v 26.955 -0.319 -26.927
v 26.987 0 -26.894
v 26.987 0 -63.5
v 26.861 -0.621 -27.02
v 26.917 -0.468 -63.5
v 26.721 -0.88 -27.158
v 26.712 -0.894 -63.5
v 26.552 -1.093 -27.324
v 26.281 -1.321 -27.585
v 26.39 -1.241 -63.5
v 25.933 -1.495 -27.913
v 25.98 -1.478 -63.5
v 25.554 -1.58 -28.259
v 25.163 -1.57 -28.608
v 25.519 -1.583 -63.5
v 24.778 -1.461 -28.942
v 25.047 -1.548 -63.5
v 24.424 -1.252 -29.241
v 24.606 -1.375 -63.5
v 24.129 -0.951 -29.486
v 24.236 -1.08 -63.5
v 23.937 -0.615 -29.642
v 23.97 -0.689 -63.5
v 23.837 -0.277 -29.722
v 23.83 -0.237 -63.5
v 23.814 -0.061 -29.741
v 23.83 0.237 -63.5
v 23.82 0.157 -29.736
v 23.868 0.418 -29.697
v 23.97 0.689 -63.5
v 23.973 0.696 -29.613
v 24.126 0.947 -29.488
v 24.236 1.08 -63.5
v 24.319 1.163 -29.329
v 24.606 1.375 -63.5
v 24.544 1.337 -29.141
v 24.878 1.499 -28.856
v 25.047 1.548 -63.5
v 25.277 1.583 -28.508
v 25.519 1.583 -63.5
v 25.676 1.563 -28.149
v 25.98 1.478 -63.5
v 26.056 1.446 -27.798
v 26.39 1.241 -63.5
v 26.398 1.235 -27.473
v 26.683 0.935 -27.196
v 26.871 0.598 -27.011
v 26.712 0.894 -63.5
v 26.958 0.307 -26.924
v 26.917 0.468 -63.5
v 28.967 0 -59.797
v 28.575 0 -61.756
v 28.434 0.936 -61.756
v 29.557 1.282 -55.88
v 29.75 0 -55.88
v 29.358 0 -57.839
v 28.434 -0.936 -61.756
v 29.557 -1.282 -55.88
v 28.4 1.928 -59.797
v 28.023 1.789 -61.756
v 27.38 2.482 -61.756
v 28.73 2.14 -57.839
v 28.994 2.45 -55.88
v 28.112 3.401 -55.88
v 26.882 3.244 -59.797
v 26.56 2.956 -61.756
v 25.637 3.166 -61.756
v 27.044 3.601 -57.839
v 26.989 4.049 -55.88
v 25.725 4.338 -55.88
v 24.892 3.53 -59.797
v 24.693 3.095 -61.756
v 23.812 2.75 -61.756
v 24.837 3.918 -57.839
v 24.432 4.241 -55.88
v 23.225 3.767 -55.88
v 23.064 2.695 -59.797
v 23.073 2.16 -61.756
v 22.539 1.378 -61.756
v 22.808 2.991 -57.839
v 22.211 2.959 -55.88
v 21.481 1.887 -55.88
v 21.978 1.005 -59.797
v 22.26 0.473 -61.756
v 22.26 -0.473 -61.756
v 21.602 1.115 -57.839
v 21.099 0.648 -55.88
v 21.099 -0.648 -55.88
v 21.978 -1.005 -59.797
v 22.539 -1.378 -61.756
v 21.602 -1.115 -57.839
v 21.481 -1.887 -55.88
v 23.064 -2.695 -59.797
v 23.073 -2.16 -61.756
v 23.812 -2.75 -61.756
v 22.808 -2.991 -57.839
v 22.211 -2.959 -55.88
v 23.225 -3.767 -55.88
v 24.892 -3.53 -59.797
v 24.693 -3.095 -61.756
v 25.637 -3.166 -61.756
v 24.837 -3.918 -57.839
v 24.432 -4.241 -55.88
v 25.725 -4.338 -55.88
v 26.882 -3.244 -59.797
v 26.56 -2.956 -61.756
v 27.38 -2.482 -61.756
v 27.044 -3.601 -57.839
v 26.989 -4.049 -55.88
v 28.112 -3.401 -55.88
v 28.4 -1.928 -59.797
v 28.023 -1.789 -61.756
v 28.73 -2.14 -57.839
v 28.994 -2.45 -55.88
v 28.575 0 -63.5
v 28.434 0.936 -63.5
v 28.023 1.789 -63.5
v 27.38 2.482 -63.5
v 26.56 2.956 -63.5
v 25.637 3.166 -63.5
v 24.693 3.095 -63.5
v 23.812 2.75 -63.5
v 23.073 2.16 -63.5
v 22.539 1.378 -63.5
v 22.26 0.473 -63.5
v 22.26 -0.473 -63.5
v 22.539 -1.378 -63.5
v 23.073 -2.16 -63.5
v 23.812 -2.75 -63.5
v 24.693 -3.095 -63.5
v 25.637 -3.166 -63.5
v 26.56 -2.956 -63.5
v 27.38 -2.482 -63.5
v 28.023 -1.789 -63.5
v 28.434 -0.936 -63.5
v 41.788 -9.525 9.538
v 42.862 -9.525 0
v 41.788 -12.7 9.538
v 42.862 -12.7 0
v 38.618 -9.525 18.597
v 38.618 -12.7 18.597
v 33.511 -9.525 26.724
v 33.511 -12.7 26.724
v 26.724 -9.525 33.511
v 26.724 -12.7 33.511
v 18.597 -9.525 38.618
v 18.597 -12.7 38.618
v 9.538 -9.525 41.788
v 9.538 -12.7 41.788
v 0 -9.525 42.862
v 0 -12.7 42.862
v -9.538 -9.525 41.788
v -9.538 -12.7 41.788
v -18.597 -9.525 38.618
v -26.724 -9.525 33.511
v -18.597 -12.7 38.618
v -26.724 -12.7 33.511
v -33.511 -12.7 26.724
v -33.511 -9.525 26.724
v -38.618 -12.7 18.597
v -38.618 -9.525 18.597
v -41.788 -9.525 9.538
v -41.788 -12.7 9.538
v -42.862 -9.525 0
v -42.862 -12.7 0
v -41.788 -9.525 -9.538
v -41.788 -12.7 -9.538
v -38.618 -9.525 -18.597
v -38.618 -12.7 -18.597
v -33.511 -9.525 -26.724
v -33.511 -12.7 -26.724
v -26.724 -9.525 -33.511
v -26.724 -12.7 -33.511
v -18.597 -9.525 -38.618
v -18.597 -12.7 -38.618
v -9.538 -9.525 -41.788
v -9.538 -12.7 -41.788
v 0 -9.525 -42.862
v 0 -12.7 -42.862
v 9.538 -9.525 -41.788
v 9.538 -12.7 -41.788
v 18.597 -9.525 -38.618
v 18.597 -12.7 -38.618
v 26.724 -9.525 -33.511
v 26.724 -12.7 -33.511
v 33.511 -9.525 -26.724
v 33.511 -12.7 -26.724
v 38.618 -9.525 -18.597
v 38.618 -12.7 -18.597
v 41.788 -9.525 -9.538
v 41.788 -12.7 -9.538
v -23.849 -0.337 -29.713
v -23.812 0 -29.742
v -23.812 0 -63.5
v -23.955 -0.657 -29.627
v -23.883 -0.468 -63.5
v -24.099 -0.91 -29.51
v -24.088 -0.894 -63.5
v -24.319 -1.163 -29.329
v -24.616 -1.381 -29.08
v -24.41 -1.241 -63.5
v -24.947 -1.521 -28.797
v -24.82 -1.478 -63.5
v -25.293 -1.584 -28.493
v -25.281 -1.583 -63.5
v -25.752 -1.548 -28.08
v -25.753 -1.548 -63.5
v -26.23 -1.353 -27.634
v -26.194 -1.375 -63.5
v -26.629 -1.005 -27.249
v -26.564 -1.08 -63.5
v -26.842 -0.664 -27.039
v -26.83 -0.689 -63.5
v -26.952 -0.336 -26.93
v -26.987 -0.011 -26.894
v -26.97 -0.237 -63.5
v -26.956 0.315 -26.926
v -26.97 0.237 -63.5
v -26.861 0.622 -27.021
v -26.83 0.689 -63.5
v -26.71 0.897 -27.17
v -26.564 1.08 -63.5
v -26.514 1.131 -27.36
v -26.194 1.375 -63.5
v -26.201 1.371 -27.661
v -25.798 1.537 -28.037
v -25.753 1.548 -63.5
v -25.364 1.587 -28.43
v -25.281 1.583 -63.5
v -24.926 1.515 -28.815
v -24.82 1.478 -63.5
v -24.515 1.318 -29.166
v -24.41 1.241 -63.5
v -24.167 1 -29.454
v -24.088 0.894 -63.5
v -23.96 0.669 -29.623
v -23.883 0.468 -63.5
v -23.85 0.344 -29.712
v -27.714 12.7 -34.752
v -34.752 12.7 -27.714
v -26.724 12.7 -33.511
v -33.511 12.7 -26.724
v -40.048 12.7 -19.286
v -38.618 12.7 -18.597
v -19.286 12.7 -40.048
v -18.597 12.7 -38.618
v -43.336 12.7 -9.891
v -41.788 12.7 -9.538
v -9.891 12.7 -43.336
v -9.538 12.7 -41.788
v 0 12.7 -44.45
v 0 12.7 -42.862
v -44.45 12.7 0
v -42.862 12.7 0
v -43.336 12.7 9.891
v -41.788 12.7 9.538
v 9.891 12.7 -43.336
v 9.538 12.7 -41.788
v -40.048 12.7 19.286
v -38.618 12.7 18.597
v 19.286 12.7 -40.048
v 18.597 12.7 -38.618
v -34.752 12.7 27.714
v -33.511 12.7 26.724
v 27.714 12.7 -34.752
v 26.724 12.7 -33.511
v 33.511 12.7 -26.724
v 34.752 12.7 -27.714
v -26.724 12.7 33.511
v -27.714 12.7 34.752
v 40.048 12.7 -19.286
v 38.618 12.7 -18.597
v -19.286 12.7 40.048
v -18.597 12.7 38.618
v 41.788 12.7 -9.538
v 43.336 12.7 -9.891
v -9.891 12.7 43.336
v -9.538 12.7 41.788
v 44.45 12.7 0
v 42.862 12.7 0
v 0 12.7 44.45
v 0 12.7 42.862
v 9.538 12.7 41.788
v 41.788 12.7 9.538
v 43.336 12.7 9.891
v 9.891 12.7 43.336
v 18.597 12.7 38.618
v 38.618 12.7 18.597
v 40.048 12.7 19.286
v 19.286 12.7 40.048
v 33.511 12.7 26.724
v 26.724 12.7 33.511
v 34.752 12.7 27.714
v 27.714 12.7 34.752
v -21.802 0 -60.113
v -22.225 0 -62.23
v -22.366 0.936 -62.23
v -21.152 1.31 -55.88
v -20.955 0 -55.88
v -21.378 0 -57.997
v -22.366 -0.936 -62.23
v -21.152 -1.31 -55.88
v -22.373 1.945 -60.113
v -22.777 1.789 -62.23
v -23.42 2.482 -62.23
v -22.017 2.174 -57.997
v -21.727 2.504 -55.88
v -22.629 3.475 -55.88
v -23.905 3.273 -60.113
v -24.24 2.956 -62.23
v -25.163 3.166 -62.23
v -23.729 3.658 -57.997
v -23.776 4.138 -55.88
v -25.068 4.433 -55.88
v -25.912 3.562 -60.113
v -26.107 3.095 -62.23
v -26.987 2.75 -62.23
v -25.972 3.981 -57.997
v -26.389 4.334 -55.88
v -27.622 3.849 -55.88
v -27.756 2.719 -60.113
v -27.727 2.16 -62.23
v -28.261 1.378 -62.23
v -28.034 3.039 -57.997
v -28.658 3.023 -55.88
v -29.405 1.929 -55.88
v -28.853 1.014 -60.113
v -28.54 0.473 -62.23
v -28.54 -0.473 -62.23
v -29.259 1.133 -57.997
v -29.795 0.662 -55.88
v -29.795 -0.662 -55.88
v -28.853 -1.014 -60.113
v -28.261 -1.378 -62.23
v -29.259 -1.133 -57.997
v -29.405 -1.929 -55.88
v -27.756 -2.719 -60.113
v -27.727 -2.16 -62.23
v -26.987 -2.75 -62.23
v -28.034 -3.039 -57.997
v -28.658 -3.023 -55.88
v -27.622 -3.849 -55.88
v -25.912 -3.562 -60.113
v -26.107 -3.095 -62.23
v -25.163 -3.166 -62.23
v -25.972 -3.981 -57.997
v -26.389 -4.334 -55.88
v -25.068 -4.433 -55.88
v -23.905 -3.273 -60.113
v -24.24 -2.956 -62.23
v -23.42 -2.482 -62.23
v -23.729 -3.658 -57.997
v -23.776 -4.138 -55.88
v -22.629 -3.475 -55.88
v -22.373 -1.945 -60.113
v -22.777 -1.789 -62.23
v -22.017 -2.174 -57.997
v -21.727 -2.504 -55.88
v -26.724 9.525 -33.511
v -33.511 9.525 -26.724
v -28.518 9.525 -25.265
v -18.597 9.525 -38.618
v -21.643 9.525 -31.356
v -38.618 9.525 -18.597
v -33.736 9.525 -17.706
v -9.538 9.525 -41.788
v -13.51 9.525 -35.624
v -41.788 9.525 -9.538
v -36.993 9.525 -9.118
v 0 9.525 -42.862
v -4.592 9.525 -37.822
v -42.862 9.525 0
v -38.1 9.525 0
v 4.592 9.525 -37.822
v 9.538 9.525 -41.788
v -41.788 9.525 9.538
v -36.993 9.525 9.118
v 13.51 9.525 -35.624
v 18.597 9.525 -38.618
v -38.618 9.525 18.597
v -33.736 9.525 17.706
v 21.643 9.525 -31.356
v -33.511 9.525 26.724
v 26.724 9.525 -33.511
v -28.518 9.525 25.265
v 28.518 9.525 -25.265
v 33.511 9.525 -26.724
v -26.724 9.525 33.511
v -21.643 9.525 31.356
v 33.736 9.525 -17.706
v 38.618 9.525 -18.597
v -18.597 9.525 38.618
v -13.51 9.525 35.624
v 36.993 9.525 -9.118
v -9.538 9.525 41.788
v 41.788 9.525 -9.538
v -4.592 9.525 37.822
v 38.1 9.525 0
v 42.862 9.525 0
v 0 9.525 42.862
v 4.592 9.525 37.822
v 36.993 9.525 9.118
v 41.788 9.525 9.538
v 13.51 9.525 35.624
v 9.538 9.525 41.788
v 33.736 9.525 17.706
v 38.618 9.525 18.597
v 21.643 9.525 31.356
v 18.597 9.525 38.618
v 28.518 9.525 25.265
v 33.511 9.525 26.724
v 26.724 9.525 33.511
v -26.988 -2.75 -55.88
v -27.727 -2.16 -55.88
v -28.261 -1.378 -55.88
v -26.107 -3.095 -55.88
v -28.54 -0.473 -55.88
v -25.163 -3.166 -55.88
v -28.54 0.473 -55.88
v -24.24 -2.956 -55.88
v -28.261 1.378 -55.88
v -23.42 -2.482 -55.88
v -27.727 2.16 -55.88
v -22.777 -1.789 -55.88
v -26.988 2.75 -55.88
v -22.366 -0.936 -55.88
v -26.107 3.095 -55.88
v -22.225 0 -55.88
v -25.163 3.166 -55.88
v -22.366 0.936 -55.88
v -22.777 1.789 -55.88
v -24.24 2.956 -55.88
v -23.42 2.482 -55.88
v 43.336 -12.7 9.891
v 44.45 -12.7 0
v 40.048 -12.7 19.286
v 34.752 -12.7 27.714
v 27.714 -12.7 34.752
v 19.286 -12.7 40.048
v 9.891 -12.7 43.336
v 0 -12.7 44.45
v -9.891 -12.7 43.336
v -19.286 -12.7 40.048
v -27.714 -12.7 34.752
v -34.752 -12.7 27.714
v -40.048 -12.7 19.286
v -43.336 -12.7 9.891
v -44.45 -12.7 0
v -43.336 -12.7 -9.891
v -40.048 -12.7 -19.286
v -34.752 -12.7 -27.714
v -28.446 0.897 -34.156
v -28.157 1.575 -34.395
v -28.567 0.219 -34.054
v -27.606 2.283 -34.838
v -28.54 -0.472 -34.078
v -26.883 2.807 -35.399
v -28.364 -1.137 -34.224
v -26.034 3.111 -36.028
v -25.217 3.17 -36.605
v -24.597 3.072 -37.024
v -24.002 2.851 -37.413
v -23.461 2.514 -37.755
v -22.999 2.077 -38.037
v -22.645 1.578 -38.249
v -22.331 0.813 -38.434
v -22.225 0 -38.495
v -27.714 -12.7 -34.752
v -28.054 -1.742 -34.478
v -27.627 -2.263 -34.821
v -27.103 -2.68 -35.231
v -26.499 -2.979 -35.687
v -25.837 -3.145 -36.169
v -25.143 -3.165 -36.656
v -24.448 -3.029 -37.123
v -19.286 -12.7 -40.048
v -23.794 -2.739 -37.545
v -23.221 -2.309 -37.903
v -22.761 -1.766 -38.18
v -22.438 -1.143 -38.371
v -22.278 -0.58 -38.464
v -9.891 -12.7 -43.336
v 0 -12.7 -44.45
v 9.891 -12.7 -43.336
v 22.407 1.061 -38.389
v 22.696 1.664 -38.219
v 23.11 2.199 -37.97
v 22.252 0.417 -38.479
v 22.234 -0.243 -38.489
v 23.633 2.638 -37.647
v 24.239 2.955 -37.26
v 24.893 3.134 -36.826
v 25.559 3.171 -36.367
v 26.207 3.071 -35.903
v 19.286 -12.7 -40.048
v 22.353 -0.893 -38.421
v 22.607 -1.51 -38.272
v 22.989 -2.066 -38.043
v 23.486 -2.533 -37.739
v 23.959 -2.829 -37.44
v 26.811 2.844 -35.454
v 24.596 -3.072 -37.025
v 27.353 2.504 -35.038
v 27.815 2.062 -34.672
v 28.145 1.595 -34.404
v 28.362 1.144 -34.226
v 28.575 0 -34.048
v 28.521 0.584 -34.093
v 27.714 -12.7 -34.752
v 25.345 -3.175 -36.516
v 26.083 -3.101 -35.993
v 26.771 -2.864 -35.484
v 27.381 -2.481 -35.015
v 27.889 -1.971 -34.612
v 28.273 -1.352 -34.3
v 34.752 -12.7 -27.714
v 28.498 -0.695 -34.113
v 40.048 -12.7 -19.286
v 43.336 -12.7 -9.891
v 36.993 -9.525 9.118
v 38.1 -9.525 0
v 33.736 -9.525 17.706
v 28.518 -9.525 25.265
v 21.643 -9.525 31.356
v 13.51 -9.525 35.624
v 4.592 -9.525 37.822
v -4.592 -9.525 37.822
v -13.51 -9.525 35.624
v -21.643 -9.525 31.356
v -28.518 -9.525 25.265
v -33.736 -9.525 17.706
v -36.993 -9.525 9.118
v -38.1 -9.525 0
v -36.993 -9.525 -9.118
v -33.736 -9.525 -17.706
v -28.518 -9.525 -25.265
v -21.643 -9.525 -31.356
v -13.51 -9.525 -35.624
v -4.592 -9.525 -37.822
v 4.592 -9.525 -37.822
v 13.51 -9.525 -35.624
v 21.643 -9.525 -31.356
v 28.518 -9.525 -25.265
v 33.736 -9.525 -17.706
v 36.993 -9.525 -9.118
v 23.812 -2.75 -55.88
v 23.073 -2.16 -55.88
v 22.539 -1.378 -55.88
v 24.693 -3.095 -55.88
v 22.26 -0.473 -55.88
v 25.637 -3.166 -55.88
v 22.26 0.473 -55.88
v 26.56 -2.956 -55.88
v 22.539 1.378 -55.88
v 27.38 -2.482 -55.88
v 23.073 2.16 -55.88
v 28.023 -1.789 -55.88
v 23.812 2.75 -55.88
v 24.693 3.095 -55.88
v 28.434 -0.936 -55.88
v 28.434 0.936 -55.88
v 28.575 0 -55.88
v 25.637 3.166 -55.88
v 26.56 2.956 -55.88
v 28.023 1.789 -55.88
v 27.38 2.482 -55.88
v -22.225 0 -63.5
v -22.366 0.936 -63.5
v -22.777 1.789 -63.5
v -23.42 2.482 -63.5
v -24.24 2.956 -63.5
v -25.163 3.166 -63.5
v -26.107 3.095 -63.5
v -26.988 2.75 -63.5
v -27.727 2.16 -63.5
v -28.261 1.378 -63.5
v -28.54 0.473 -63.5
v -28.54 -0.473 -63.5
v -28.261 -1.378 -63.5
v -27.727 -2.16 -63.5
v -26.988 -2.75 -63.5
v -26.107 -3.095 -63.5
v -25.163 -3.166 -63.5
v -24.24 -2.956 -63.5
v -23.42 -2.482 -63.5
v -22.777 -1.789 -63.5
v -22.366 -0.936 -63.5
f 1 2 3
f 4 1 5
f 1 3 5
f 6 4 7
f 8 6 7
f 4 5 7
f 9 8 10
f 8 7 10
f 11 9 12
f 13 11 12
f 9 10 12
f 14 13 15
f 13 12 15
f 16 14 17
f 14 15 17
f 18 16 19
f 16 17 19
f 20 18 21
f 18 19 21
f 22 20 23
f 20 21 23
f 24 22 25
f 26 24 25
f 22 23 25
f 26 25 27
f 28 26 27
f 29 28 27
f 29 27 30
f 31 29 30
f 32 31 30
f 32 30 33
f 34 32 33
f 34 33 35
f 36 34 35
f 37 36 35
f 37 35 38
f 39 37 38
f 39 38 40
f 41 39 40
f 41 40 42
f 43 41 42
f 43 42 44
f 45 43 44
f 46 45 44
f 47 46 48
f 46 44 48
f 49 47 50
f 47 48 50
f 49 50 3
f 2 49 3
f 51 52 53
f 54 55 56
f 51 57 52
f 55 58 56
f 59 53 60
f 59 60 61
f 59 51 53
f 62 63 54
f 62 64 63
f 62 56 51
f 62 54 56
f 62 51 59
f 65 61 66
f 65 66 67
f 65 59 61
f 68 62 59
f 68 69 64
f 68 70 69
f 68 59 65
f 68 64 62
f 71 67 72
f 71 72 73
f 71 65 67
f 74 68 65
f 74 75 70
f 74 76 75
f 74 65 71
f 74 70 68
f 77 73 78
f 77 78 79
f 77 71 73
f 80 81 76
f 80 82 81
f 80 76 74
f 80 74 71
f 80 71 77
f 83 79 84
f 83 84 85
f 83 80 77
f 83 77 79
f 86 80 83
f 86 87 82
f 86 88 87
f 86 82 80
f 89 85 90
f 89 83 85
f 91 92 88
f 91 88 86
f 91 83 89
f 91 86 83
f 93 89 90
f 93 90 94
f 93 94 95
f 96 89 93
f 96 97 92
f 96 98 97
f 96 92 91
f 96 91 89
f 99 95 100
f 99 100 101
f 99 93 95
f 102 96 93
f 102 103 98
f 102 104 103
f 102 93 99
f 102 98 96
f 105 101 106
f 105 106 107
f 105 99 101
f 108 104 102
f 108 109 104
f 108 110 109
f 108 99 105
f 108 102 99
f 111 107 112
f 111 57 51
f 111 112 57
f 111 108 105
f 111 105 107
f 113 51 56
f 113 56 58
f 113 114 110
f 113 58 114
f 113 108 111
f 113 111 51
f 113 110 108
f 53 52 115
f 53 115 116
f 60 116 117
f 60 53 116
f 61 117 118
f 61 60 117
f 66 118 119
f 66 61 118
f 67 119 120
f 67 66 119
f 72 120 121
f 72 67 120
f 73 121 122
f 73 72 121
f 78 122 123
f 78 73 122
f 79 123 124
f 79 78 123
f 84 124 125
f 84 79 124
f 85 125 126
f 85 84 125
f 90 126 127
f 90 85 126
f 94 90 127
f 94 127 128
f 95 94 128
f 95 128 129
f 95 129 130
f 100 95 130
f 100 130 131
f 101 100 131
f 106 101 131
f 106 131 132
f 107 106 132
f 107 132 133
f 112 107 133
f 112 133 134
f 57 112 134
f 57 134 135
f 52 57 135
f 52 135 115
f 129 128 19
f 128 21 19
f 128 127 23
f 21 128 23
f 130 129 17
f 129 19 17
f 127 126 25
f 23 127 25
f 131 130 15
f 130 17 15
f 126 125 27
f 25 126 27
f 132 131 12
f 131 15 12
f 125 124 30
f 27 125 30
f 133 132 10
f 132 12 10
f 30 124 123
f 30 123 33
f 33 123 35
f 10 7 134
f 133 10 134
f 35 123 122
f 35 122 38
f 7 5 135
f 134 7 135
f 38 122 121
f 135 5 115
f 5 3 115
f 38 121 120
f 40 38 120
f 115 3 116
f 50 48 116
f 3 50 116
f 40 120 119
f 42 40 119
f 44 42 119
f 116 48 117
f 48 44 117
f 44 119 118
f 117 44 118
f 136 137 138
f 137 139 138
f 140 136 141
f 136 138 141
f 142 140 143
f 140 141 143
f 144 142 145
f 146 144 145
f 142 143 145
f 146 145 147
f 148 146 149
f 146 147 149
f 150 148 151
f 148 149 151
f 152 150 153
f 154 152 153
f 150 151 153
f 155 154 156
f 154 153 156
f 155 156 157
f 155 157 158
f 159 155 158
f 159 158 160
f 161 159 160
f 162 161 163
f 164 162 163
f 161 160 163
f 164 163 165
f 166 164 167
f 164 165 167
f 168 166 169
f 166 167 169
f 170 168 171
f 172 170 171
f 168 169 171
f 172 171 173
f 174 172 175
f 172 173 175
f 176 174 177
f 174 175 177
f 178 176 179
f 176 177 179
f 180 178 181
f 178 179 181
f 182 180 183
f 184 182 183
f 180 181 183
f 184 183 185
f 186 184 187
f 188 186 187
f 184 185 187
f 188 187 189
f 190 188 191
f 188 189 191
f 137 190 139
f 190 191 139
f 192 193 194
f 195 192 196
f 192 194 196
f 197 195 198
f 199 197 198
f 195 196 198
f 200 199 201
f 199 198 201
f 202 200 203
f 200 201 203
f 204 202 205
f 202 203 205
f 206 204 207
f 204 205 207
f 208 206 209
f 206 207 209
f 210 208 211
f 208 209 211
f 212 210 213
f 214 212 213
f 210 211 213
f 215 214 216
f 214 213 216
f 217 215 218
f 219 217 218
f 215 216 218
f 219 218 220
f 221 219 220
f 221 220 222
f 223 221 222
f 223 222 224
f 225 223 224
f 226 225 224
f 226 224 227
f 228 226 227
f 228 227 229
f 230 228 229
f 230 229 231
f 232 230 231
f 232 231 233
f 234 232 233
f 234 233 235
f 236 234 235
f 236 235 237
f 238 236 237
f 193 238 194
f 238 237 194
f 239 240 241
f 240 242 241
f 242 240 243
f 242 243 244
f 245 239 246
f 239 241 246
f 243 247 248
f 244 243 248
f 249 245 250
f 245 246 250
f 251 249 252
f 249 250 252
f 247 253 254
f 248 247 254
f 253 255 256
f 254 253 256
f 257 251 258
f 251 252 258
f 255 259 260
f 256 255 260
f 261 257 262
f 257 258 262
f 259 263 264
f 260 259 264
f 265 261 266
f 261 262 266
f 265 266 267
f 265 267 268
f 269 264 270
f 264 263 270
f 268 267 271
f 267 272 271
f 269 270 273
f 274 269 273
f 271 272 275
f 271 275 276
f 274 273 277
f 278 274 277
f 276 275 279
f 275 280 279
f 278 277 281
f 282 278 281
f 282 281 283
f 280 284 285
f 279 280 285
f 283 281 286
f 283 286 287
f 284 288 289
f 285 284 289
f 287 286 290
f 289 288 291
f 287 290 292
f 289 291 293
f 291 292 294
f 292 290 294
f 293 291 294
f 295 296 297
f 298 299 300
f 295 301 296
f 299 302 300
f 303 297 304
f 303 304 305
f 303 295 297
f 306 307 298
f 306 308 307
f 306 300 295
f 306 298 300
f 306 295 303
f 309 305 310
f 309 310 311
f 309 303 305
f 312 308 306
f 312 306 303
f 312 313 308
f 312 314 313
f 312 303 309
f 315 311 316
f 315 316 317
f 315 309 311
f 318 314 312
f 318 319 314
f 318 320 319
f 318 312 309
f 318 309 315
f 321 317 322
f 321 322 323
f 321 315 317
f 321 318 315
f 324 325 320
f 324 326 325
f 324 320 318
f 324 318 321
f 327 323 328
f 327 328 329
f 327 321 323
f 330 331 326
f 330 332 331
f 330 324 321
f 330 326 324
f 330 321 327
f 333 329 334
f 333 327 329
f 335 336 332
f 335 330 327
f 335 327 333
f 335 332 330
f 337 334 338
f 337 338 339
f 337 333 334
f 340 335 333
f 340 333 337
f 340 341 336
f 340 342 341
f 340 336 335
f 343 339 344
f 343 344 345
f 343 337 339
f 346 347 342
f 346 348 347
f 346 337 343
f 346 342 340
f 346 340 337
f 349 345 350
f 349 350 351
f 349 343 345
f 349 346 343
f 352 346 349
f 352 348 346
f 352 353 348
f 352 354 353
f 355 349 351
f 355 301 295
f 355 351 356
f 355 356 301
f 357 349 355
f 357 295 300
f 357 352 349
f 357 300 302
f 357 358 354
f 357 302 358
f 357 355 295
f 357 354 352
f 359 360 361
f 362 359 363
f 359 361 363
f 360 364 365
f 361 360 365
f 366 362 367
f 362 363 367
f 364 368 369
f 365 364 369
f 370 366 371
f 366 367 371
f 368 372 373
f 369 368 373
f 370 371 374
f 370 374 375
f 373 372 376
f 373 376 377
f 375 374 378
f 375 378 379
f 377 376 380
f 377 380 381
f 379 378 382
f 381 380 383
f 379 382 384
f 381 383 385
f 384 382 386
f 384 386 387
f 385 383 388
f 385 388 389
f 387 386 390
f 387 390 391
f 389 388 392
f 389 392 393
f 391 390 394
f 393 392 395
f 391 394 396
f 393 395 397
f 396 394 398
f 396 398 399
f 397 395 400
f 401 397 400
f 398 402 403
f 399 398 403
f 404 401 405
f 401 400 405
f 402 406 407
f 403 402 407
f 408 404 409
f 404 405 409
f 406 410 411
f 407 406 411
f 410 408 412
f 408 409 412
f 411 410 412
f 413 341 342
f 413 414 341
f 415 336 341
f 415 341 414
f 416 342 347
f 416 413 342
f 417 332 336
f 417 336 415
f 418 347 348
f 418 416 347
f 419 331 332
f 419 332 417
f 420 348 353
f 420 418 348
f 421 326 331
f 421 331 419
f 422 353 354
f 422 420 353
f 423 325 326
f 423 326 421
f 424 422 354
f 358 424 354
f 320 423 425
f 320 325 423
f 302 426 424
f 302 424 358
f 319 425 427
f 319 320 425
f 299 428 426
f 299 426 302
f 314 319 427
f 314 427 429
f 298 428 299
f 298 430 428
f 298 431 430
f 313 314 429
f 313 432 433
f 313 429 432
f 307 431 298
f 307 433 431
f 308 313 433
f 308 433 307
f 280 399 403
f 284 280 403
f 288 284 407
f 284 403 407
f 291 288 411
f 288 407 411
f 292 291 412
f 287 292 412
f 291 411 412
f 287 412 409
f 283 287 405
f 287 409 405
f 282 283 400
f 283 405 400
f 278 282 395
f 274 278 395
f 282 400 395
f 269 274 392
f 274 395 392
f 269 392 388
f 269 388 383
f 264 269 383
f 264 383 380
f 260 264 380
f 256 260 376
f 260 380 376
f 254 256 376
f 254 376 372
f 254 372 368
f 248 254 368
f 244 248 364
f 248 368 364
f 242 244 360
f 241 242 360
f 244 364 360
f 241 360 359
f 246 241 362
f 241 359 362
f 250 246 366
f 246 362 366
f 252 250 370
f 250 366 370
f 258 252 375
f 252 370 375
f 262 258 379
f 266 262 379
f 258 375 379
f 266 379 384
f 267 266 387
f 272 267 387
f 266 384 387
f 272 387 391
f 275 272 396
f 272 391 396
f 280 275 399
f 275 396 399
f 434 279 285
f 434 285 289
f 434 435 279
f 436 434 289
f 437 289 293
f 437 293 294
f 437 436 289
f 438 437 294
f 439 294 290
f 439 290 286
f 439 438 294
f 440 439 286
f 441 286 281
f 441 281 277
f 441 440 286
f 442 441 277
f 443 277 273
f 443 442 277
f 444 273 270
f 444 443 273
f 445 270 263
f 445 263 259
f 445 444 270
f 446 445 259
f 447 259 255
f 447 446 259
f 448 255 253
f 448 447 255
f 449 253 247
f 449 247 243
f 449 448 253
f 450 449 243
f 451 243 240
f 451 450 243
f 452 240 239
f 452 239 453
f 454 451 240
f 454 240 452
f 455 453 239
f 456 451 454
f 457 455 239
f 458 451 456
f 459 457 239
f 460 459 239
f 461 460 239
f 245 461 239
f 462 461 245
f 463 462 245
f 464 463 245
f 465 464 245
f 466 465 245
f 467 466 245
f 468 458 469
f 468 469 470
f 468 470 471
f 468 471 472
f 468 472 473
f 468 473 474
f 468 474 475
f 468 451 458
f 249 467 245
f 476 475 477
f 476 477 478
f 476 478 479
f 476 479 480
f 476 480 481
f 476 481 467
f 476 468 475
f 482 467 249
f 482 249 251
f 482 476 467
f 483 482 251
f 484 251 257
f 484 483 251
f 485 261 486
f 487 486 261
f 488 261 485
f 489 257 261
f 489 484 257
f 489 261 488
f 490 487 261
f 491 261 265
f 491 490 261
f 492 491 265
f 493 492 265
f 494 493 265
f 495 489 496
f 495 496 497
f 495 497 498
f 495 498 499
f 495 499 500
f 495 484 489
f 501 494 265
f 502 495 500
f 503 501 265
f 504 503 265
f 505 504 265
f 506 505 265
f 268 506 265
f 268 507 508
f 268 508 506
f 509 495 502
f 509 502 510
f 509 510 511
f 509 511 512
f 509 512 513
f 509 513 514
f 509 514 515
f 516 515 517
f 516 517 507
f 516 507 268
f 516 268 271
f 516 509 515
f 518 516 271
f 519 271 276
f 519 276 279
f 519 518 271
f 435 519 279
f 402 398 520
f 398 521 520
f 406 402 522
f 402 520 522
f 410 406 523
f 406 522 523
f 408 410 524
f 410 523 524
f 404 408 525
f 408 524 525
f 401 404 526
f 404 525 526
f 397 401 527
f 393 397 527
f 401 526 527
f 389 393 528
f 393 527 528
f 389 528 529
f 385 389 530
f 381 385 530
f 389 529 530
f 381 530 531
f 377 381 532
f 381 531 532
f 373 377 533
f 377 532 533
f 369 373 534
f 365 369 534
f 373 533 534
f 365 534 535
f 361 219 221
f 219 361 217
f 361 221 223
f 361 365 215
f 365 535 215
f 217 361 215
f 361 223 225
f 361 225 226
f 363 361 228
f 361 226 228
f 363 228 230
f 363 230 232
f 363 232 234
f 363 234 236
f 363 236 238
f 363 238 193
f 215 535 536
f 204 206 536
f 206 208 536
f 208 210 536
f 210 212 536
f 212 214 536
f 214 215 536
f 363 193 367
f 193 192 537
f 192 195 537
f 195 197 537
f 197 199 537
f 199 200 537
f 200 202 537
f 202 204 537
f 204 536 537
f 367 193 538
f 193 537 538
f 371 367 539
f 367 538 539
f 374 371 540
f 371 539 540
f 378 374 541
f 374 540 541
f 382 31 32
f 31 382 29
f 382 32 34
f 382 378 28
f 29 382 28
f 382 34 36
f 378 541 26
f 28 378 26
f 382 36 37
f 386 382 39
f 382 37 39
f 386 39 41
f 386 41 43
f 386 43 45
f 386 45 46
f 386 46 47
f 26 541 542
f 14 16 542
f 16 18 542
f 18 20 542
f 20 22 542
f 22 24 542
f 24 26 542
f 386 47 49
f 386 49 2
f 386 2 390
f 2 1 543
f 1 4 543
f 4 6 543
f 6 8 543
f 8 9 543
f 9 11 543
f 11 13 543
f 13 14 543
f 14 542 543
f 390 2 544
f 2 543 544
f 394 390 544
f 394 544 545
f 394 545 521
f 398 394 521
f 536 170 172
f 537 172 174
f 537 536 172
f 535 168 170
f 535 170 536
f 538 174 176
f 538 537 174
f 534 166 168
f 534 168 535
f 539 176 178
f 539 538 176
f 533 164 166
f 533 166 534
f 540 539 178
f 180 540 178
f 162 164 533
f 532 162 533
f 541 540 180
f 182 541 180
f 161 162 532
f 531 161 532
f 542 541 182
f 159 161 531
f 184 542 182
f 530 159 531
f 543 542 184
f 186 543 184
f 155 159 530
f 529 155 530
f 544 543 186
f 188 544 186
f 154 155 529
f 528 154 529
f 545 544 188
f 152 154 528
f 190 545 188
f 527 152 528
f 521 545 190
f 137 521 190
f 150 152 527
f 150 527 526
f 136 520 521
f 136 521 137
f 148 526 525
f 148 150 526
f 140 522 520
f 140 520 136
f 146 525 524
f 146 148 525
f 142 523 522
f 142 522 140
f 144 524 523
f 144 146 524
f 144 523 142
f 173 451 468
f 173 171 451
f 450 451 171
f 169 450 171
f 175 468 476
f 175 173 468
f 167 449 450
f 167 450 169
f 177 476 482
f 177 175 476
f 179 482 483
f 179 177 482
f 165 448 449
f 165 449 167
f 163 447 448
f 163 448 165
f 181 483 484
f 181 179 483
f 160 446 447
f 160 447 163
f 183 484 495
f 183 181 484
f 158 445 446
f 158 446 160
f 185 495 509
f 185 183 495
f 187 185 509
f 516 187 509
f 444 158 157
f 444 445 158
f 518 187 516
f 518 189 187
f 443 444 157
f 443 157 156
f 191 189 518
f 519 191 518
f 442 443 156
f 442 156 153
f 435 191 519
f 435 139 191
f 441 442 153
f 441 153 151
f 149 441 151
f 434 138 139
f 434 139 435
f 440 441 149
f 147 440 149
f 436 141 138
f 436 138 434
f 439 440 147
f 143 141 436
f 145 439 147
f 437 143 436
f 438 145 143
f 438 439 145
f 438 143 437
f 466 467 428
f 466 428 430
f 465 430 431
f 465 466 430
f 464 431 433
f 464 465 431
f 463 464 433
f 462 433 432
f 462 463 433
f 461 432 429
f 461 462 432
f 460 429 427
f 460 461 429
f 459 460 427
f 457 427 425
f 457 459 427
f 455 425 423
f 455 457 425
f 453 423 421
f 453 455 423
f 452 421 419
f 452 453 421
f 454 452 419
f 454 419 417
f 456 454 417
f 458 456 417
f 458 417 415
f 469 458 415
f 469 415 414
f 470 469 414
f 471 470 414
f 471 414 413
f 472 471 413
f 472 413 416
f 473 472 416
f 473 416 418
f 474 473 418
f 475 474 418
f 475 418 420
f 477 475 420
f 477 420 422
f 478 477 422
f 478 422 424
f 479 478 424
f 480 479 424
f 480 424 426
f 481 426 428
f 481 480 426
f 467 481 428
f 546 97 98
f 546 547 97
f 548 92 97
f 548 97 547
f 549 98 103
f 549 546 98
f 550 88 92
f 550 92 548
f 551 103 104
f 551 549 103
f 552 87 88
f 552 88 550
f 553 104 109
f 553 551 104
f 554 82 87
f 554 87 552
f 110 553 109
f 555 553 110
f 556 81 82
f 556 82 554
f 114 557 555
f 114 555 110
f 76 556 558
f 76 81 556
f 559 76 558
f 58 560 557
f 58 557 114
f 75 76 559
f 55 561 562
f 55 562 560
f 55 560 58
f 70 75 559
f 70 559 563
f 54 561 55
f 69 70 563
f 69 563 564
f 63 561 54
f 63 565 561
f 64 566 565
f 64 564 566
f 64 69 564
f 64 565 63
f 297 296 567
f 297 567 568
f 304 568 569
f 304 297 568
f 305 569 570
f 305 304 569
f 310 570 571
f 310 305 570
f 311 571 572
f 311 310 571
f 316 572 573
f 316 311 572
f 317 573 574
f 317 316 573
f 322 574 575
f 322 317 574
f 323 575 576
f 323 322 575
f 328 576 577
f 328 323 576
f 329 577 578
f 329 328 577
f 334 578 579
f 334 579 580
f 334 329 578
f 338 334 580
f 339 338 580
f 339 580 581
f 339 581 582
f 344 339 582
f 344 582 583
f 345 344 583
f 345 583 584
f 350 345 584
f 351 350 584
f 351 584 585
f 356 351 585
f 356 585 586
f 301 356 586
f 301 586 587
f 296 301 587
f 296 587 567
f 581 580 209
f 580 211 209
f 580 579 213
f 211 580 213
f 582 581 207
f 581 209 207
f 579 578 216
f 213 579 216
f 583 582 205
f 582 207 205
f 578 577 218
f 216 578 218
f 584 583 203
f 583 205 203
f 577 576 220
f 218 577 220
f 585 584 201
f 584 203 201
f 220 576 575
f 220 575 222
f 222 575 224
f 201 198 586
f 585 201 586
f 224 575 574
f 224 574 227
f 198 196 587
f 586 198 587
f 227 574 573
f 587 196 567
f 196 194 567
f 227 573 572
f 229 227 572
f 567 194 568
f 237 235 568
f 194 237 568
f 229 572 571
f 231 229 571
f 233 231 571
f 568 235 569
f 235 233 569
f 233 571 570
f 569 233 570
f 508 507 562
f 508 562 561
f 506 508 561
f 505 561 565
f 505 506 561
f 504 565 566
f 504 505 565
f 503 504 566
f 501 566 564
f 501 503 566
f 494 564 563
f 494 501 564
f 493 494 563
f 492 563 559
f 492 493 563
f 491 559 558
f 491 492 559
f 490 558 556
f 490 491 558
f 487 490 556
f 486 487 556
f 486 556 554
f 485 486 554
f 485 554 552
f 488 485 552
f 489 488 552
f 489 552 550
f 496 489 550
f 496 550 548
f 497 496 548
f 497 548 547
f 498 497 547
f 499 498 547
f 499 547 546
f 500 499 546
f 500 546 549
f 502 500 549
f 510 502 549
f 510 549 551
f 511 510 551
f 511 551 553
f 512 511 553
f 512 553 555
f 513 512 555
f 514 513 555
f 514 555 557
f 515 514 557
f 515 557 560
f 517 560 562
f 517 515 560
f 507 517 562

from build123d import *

# Parameters (mm, degrees)
F0_R      = 44.45
F1_DEPTH  = 12.7
F2_R      = 42.8625
F4_DEPTH  = 12.7
F3_R      = 42.8625
F5_DEPTH  = 9.525
F8_R      = 3.175
F9_DEPTH  = 63.5
F7_R      = 3.175
F10_DEPTH = 63.5
F15_R     = 1.5875
F16_DEPTH = 76.2
F17_R     = 1.5875
F18_DEPTH = 63.5
F6_R      = 38.1
F19_DEPTH = 12.7


with BuildPart() as f1:
    # F0 (on Front) → F1 (new body, symmetric)
    with BuildSketch(Plane.XZ):
        Circle(F0_R)
    extrude(amount=F1_DEPTH, both=True)

    # F2 (on Front) → F4 (cut, symmetric)
    with BuildSketch(Plane.XZ):
        Circle(F2_R)
    extrude(amount=F4_DEPTH, both=True, mode=Mode.SUBTRACT)

    # F3 (on Front) → F5 (join, symmetric)
    with BuildSketch(Plane.XZ):
        Circle(F3_R)
    extrude(amount=F5_DEPTH, both=True)

    # F8 (on Top) → F9 (join)
    with BuildSketch(Plane.XY):
        with Locations((25.4, 0)):
            Circle(F8_R)
    extrude(amount=-F9_DEPTH)

    # F7 (on Top) → F10 (join)
    with BuildSketch(Plane.XY):
        with Locations((-25.4, 0)):
            Circle(F7_R)
    extrude(amount=-F10_DEPTH)

    # F11 (on Front) → F12 (revolve)
    with BuildSketch(Plane.XZ):
        Polygon((28.479918, -55.88), (28.480154, -62.23), (29.749918, -55.88), align=None)
    revolve(axis=Axis((25.4, 0, -63.5), (0, 0, 1)))

    # F13 (on Front) → F14 (revolve)
    with BuildSketch(Plane.XZ):
        Polygon((-22.225006, -55.88), (-22.225006, -62.23), (-20.955006, -55.88), align=None)
    revolve(axis=Axis((-25.4, 0, -63.5), (0, 0, 1)))

    # F15 (on face) → F16 (cut)
    with BuildSketch(Plane(origin=(0, 0, -63.5), x_dir=(1, 0, 0), z_dir=(0, 0, -1))):
        with Locations((25.4, 0)):
            Circle(F15_R)
    extrude(amount=-F16_DEPTH, mode=Mode.SUBTRACT)

    # F17 (on face) → F18 (cut)
    with BuildSketch(Plane(origin=(0, 0, -63.5), x_dir=(1, 0, 0), z_dir=(0, 0, -1))):
        with Locations((-25.4, 0)):
            Circle(F17_R)
    extrude(amount=-F18_DEPTH, mode=Mode.SUBTRACT)

    # F6 (on Front) → F19 (cut, symmetric)
    with BuildSketch(Plane.XZ):
        Circle(F6_R)
    extrude(amount=F19_DEPTH, both=True, mode=Mode.SUBTRACT)


solid = f1.part
